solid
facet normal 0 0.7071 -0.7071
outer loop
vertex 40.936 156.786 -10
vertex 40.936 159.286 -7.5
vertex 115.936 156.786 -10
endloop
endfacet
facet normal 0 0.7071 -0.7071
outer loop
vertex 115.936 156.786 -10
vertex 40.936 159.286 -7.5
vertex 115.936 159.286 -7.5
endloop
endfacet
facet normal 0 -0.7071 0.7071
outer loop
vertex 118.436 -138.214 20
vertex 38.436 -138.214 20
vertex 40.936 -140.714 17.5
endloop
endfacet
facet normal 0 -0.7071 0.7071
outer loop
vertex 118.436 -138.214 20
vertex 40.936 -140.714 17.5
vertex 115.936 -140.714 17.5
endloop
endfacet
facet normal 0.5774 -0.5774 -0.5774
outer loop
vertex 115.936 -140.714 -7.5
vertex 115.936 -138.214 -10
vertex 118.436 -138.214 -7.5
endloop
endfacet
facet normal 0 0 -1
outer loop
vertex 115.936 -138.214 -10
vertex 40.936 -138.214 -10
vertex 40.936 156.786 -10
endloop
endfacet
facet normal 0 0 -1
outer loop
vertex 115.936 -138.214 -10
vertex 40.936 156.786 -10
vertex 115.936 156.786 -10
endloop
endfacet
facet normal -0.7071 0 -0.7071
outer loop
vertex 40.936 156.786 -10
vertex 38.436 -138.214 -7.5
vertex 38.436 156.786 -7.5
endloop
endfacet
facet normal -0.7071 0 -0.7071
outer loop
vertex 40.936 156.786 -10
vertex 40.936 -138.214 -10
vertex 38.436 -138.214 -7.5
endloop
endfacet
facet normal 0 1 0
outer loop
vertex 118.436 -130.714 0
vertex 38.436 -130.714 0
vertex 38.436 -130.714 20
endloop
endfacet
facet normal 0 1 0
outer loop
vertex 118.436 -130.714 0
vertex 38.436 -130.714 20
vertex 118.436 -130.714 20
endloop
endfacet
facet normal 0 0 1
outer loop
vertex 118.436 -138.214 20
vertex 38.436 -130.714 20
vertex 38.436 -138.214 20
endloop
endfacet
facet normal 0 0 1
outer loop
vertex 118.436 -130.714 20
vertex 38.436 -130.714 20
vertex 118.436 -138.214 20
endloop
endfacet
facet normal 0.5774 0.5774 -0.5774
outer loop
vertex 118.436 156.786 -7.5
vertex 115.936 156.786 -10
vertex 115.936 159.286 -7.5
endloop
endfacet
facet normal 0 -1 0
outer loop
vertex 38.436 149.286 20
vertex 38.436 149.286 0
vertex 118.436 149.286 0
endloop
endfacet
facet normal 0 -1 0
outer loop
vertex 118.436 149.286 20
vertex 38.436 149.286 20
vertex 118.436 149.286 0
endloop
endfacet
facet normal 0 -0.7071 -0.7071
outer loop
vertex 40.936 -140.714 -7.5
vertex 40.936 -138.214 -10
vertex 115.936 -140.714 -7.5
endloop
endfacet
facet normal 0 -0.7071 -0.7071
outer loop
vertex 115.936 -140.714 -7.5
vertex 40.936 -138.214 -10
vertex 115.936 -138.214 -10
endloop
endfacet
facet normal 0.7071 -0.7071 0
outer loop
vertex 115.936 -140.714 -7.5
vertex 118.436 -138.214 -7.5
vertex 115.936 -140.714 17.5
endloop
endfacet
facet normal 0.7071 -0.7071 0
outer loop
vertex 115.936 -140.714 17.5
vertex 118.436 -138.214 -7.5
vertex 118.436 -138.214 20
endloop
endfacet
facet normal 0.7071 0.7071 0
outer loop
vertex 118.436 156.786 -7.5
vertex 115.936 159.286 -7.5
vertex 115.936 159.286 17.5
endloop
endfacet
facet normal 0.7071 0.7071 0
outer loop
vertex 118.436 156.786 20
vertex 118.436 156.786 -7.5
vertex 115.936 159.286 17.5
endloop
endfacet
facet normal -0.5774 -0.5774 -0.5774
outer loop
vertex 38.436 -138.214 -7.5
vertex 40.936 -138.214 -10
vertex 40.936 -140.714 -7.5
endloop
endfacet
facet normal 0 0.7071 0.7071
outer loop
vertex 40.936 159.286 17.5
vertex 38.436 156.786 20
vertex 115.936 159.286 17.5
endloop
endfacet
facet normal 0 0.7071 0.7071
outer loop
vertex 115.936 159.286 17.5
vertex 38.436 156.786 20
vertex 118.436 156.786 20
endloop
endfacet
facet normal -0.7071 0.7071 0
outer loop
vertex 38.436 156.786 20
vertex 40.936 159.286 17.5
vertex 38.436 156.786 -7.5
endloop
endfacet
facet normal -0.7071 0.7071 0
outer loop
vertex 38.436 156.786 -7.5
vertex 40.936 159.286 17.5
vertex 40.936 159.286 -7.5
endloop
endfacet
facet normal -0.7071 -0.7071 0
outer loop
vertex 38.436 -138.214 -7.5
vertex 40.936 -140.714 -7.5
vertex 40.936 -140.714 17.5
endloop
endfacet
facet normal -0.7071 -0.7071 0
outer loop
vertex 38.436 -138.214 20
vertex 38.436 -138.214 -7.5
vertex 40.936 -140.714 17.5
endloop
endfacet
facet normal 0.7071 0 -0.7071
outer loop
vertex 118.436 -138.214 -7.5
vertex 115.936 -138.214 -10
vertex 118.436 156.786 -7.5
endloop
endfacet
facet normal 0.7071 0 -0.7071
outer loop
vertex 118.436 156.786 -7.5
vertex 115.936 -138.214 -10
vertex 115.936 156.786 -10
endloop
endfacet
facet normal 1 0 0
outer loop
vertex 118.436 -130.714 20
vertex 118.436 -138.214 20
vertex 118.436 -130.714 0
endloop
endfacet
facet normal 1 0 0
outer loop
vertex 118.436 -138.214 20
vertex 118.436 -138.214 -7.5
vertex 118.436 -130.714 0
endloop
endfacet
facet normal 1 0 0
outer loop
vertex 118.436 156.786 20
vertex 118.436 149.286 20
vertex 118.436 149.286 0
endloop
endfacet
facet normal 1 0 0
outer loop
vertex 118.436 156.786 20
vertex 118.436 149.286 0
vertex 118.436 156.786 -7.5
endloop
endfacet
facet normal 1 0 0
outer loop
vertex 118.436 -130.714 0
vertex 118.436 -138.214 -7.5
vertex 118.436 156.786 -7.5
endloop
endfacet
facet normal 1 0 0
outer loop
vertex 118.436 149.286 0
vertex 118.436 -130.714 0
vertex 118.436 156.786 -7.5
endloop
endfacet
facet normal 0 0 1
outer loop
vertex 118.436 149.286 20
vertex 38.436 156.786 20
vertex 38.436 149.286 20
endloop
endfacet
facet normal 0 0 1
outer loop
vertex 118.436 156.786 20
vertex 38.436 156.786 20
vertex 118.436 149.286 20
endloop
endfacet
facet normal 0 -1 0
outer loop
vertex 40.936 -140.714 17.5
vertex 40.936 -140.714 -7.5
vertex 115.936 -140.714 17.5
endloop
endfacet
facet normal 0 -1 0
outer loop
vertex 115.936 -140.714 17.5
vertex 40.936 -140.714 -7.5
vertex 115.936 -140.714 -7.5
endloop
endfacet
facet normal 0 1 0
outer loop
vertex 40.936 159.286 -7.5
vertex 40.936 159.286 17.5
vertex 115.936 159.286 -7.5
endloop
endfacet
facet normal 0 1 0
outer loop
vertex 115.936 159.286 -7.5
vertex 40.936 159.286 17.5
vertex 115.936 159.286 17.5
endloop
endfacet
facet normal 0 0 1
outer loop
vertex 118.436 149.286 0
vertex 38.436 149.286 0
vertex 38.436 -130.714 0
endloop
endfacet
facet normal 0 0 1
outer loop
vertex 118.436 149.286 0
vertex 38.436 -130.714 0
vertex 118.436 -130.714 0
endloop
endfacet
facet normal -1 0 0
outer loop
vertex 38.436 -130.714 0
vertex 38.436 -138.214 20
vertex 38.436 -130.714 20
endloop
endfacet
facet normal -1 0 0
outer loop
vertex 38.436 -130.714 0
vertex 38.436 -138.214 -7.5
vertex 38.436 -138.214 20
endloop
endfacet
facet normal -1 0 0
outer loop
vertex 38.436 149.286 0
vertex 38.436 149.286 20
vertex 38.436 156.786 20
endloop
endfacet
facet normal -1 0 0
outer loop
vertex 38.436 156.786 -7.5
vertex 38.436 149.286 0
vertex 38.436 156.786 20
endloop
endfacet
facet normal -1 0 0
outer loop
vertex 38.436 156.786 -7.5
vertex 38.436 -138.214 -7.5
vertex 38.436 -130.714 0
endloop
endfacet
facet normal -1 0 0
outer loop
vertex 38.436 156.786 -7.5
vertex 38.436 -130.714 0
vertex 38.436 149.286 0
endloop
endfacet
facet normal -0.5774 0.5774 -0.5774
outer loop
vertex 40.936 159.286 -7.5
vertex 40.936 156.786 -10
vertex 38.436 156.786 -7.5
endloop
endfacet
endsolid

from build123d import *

# Parameters (mm, degrees)
SKETCH_1_W      = 80
SKETCH_1_H      = 300
EXTRUDE_1_DEPTH = 10
SKETCH_2_W      = 80
SKETCH_2_H      = 10
EXTRUDE_2_DEPTH = 20
CHAMFER_1_SIZE  = 2.5


with BuildPart() as part:
    # 草圖1 → 填料-伸長1 (new body)
    with BuildSketch(Plane.XY):
        with Locations((78.435797513, 9.285783834)):
            Rectangle(SKETCH_1_W, SKETCH_1_H)
    extrude(amount=-EXTRUDE_1_DEPTH)

    # 草圖2 → 填料-伸長2 (add)
    with BuildSketch(Plane.XY):
        with Locations((78.435797513, -135.714216166)):
            Rectangle(SKETCH_2_W, SKETCH_2_H)
        with Locations((78.435797513, 154.285783834)):
            Rectangle(SKETCH_2_W, SKETCH_2_H)
    extrude(amount=EXTRUDE_2_DEPTH)

    # 導角1
    chamfer_1_edges = [part.edges().sort_by_distance(p)[0] for p in [
        (118.435797513, 9.285783834, -10),
        (78.435797513, 159.285783834, -10),
        (78.435797513, -140.714216166, 20),
        (78.435797513, 159.285783834, 20),
        (38.435797513, 9.285783834, -10),
        (78.435797513, -140.714216166, -10),
        (38.435797513, 159.285783834, 5),
        (118.435797513, 159.285783834, 5),
        (118.435797513, -140.714216166, 5),
        (38.435797513, -140.714216166, 5),
    ]]
    chamfer(chamfer_1_edges, length=CHAMFER_1_SIZE)


solid = part.part
